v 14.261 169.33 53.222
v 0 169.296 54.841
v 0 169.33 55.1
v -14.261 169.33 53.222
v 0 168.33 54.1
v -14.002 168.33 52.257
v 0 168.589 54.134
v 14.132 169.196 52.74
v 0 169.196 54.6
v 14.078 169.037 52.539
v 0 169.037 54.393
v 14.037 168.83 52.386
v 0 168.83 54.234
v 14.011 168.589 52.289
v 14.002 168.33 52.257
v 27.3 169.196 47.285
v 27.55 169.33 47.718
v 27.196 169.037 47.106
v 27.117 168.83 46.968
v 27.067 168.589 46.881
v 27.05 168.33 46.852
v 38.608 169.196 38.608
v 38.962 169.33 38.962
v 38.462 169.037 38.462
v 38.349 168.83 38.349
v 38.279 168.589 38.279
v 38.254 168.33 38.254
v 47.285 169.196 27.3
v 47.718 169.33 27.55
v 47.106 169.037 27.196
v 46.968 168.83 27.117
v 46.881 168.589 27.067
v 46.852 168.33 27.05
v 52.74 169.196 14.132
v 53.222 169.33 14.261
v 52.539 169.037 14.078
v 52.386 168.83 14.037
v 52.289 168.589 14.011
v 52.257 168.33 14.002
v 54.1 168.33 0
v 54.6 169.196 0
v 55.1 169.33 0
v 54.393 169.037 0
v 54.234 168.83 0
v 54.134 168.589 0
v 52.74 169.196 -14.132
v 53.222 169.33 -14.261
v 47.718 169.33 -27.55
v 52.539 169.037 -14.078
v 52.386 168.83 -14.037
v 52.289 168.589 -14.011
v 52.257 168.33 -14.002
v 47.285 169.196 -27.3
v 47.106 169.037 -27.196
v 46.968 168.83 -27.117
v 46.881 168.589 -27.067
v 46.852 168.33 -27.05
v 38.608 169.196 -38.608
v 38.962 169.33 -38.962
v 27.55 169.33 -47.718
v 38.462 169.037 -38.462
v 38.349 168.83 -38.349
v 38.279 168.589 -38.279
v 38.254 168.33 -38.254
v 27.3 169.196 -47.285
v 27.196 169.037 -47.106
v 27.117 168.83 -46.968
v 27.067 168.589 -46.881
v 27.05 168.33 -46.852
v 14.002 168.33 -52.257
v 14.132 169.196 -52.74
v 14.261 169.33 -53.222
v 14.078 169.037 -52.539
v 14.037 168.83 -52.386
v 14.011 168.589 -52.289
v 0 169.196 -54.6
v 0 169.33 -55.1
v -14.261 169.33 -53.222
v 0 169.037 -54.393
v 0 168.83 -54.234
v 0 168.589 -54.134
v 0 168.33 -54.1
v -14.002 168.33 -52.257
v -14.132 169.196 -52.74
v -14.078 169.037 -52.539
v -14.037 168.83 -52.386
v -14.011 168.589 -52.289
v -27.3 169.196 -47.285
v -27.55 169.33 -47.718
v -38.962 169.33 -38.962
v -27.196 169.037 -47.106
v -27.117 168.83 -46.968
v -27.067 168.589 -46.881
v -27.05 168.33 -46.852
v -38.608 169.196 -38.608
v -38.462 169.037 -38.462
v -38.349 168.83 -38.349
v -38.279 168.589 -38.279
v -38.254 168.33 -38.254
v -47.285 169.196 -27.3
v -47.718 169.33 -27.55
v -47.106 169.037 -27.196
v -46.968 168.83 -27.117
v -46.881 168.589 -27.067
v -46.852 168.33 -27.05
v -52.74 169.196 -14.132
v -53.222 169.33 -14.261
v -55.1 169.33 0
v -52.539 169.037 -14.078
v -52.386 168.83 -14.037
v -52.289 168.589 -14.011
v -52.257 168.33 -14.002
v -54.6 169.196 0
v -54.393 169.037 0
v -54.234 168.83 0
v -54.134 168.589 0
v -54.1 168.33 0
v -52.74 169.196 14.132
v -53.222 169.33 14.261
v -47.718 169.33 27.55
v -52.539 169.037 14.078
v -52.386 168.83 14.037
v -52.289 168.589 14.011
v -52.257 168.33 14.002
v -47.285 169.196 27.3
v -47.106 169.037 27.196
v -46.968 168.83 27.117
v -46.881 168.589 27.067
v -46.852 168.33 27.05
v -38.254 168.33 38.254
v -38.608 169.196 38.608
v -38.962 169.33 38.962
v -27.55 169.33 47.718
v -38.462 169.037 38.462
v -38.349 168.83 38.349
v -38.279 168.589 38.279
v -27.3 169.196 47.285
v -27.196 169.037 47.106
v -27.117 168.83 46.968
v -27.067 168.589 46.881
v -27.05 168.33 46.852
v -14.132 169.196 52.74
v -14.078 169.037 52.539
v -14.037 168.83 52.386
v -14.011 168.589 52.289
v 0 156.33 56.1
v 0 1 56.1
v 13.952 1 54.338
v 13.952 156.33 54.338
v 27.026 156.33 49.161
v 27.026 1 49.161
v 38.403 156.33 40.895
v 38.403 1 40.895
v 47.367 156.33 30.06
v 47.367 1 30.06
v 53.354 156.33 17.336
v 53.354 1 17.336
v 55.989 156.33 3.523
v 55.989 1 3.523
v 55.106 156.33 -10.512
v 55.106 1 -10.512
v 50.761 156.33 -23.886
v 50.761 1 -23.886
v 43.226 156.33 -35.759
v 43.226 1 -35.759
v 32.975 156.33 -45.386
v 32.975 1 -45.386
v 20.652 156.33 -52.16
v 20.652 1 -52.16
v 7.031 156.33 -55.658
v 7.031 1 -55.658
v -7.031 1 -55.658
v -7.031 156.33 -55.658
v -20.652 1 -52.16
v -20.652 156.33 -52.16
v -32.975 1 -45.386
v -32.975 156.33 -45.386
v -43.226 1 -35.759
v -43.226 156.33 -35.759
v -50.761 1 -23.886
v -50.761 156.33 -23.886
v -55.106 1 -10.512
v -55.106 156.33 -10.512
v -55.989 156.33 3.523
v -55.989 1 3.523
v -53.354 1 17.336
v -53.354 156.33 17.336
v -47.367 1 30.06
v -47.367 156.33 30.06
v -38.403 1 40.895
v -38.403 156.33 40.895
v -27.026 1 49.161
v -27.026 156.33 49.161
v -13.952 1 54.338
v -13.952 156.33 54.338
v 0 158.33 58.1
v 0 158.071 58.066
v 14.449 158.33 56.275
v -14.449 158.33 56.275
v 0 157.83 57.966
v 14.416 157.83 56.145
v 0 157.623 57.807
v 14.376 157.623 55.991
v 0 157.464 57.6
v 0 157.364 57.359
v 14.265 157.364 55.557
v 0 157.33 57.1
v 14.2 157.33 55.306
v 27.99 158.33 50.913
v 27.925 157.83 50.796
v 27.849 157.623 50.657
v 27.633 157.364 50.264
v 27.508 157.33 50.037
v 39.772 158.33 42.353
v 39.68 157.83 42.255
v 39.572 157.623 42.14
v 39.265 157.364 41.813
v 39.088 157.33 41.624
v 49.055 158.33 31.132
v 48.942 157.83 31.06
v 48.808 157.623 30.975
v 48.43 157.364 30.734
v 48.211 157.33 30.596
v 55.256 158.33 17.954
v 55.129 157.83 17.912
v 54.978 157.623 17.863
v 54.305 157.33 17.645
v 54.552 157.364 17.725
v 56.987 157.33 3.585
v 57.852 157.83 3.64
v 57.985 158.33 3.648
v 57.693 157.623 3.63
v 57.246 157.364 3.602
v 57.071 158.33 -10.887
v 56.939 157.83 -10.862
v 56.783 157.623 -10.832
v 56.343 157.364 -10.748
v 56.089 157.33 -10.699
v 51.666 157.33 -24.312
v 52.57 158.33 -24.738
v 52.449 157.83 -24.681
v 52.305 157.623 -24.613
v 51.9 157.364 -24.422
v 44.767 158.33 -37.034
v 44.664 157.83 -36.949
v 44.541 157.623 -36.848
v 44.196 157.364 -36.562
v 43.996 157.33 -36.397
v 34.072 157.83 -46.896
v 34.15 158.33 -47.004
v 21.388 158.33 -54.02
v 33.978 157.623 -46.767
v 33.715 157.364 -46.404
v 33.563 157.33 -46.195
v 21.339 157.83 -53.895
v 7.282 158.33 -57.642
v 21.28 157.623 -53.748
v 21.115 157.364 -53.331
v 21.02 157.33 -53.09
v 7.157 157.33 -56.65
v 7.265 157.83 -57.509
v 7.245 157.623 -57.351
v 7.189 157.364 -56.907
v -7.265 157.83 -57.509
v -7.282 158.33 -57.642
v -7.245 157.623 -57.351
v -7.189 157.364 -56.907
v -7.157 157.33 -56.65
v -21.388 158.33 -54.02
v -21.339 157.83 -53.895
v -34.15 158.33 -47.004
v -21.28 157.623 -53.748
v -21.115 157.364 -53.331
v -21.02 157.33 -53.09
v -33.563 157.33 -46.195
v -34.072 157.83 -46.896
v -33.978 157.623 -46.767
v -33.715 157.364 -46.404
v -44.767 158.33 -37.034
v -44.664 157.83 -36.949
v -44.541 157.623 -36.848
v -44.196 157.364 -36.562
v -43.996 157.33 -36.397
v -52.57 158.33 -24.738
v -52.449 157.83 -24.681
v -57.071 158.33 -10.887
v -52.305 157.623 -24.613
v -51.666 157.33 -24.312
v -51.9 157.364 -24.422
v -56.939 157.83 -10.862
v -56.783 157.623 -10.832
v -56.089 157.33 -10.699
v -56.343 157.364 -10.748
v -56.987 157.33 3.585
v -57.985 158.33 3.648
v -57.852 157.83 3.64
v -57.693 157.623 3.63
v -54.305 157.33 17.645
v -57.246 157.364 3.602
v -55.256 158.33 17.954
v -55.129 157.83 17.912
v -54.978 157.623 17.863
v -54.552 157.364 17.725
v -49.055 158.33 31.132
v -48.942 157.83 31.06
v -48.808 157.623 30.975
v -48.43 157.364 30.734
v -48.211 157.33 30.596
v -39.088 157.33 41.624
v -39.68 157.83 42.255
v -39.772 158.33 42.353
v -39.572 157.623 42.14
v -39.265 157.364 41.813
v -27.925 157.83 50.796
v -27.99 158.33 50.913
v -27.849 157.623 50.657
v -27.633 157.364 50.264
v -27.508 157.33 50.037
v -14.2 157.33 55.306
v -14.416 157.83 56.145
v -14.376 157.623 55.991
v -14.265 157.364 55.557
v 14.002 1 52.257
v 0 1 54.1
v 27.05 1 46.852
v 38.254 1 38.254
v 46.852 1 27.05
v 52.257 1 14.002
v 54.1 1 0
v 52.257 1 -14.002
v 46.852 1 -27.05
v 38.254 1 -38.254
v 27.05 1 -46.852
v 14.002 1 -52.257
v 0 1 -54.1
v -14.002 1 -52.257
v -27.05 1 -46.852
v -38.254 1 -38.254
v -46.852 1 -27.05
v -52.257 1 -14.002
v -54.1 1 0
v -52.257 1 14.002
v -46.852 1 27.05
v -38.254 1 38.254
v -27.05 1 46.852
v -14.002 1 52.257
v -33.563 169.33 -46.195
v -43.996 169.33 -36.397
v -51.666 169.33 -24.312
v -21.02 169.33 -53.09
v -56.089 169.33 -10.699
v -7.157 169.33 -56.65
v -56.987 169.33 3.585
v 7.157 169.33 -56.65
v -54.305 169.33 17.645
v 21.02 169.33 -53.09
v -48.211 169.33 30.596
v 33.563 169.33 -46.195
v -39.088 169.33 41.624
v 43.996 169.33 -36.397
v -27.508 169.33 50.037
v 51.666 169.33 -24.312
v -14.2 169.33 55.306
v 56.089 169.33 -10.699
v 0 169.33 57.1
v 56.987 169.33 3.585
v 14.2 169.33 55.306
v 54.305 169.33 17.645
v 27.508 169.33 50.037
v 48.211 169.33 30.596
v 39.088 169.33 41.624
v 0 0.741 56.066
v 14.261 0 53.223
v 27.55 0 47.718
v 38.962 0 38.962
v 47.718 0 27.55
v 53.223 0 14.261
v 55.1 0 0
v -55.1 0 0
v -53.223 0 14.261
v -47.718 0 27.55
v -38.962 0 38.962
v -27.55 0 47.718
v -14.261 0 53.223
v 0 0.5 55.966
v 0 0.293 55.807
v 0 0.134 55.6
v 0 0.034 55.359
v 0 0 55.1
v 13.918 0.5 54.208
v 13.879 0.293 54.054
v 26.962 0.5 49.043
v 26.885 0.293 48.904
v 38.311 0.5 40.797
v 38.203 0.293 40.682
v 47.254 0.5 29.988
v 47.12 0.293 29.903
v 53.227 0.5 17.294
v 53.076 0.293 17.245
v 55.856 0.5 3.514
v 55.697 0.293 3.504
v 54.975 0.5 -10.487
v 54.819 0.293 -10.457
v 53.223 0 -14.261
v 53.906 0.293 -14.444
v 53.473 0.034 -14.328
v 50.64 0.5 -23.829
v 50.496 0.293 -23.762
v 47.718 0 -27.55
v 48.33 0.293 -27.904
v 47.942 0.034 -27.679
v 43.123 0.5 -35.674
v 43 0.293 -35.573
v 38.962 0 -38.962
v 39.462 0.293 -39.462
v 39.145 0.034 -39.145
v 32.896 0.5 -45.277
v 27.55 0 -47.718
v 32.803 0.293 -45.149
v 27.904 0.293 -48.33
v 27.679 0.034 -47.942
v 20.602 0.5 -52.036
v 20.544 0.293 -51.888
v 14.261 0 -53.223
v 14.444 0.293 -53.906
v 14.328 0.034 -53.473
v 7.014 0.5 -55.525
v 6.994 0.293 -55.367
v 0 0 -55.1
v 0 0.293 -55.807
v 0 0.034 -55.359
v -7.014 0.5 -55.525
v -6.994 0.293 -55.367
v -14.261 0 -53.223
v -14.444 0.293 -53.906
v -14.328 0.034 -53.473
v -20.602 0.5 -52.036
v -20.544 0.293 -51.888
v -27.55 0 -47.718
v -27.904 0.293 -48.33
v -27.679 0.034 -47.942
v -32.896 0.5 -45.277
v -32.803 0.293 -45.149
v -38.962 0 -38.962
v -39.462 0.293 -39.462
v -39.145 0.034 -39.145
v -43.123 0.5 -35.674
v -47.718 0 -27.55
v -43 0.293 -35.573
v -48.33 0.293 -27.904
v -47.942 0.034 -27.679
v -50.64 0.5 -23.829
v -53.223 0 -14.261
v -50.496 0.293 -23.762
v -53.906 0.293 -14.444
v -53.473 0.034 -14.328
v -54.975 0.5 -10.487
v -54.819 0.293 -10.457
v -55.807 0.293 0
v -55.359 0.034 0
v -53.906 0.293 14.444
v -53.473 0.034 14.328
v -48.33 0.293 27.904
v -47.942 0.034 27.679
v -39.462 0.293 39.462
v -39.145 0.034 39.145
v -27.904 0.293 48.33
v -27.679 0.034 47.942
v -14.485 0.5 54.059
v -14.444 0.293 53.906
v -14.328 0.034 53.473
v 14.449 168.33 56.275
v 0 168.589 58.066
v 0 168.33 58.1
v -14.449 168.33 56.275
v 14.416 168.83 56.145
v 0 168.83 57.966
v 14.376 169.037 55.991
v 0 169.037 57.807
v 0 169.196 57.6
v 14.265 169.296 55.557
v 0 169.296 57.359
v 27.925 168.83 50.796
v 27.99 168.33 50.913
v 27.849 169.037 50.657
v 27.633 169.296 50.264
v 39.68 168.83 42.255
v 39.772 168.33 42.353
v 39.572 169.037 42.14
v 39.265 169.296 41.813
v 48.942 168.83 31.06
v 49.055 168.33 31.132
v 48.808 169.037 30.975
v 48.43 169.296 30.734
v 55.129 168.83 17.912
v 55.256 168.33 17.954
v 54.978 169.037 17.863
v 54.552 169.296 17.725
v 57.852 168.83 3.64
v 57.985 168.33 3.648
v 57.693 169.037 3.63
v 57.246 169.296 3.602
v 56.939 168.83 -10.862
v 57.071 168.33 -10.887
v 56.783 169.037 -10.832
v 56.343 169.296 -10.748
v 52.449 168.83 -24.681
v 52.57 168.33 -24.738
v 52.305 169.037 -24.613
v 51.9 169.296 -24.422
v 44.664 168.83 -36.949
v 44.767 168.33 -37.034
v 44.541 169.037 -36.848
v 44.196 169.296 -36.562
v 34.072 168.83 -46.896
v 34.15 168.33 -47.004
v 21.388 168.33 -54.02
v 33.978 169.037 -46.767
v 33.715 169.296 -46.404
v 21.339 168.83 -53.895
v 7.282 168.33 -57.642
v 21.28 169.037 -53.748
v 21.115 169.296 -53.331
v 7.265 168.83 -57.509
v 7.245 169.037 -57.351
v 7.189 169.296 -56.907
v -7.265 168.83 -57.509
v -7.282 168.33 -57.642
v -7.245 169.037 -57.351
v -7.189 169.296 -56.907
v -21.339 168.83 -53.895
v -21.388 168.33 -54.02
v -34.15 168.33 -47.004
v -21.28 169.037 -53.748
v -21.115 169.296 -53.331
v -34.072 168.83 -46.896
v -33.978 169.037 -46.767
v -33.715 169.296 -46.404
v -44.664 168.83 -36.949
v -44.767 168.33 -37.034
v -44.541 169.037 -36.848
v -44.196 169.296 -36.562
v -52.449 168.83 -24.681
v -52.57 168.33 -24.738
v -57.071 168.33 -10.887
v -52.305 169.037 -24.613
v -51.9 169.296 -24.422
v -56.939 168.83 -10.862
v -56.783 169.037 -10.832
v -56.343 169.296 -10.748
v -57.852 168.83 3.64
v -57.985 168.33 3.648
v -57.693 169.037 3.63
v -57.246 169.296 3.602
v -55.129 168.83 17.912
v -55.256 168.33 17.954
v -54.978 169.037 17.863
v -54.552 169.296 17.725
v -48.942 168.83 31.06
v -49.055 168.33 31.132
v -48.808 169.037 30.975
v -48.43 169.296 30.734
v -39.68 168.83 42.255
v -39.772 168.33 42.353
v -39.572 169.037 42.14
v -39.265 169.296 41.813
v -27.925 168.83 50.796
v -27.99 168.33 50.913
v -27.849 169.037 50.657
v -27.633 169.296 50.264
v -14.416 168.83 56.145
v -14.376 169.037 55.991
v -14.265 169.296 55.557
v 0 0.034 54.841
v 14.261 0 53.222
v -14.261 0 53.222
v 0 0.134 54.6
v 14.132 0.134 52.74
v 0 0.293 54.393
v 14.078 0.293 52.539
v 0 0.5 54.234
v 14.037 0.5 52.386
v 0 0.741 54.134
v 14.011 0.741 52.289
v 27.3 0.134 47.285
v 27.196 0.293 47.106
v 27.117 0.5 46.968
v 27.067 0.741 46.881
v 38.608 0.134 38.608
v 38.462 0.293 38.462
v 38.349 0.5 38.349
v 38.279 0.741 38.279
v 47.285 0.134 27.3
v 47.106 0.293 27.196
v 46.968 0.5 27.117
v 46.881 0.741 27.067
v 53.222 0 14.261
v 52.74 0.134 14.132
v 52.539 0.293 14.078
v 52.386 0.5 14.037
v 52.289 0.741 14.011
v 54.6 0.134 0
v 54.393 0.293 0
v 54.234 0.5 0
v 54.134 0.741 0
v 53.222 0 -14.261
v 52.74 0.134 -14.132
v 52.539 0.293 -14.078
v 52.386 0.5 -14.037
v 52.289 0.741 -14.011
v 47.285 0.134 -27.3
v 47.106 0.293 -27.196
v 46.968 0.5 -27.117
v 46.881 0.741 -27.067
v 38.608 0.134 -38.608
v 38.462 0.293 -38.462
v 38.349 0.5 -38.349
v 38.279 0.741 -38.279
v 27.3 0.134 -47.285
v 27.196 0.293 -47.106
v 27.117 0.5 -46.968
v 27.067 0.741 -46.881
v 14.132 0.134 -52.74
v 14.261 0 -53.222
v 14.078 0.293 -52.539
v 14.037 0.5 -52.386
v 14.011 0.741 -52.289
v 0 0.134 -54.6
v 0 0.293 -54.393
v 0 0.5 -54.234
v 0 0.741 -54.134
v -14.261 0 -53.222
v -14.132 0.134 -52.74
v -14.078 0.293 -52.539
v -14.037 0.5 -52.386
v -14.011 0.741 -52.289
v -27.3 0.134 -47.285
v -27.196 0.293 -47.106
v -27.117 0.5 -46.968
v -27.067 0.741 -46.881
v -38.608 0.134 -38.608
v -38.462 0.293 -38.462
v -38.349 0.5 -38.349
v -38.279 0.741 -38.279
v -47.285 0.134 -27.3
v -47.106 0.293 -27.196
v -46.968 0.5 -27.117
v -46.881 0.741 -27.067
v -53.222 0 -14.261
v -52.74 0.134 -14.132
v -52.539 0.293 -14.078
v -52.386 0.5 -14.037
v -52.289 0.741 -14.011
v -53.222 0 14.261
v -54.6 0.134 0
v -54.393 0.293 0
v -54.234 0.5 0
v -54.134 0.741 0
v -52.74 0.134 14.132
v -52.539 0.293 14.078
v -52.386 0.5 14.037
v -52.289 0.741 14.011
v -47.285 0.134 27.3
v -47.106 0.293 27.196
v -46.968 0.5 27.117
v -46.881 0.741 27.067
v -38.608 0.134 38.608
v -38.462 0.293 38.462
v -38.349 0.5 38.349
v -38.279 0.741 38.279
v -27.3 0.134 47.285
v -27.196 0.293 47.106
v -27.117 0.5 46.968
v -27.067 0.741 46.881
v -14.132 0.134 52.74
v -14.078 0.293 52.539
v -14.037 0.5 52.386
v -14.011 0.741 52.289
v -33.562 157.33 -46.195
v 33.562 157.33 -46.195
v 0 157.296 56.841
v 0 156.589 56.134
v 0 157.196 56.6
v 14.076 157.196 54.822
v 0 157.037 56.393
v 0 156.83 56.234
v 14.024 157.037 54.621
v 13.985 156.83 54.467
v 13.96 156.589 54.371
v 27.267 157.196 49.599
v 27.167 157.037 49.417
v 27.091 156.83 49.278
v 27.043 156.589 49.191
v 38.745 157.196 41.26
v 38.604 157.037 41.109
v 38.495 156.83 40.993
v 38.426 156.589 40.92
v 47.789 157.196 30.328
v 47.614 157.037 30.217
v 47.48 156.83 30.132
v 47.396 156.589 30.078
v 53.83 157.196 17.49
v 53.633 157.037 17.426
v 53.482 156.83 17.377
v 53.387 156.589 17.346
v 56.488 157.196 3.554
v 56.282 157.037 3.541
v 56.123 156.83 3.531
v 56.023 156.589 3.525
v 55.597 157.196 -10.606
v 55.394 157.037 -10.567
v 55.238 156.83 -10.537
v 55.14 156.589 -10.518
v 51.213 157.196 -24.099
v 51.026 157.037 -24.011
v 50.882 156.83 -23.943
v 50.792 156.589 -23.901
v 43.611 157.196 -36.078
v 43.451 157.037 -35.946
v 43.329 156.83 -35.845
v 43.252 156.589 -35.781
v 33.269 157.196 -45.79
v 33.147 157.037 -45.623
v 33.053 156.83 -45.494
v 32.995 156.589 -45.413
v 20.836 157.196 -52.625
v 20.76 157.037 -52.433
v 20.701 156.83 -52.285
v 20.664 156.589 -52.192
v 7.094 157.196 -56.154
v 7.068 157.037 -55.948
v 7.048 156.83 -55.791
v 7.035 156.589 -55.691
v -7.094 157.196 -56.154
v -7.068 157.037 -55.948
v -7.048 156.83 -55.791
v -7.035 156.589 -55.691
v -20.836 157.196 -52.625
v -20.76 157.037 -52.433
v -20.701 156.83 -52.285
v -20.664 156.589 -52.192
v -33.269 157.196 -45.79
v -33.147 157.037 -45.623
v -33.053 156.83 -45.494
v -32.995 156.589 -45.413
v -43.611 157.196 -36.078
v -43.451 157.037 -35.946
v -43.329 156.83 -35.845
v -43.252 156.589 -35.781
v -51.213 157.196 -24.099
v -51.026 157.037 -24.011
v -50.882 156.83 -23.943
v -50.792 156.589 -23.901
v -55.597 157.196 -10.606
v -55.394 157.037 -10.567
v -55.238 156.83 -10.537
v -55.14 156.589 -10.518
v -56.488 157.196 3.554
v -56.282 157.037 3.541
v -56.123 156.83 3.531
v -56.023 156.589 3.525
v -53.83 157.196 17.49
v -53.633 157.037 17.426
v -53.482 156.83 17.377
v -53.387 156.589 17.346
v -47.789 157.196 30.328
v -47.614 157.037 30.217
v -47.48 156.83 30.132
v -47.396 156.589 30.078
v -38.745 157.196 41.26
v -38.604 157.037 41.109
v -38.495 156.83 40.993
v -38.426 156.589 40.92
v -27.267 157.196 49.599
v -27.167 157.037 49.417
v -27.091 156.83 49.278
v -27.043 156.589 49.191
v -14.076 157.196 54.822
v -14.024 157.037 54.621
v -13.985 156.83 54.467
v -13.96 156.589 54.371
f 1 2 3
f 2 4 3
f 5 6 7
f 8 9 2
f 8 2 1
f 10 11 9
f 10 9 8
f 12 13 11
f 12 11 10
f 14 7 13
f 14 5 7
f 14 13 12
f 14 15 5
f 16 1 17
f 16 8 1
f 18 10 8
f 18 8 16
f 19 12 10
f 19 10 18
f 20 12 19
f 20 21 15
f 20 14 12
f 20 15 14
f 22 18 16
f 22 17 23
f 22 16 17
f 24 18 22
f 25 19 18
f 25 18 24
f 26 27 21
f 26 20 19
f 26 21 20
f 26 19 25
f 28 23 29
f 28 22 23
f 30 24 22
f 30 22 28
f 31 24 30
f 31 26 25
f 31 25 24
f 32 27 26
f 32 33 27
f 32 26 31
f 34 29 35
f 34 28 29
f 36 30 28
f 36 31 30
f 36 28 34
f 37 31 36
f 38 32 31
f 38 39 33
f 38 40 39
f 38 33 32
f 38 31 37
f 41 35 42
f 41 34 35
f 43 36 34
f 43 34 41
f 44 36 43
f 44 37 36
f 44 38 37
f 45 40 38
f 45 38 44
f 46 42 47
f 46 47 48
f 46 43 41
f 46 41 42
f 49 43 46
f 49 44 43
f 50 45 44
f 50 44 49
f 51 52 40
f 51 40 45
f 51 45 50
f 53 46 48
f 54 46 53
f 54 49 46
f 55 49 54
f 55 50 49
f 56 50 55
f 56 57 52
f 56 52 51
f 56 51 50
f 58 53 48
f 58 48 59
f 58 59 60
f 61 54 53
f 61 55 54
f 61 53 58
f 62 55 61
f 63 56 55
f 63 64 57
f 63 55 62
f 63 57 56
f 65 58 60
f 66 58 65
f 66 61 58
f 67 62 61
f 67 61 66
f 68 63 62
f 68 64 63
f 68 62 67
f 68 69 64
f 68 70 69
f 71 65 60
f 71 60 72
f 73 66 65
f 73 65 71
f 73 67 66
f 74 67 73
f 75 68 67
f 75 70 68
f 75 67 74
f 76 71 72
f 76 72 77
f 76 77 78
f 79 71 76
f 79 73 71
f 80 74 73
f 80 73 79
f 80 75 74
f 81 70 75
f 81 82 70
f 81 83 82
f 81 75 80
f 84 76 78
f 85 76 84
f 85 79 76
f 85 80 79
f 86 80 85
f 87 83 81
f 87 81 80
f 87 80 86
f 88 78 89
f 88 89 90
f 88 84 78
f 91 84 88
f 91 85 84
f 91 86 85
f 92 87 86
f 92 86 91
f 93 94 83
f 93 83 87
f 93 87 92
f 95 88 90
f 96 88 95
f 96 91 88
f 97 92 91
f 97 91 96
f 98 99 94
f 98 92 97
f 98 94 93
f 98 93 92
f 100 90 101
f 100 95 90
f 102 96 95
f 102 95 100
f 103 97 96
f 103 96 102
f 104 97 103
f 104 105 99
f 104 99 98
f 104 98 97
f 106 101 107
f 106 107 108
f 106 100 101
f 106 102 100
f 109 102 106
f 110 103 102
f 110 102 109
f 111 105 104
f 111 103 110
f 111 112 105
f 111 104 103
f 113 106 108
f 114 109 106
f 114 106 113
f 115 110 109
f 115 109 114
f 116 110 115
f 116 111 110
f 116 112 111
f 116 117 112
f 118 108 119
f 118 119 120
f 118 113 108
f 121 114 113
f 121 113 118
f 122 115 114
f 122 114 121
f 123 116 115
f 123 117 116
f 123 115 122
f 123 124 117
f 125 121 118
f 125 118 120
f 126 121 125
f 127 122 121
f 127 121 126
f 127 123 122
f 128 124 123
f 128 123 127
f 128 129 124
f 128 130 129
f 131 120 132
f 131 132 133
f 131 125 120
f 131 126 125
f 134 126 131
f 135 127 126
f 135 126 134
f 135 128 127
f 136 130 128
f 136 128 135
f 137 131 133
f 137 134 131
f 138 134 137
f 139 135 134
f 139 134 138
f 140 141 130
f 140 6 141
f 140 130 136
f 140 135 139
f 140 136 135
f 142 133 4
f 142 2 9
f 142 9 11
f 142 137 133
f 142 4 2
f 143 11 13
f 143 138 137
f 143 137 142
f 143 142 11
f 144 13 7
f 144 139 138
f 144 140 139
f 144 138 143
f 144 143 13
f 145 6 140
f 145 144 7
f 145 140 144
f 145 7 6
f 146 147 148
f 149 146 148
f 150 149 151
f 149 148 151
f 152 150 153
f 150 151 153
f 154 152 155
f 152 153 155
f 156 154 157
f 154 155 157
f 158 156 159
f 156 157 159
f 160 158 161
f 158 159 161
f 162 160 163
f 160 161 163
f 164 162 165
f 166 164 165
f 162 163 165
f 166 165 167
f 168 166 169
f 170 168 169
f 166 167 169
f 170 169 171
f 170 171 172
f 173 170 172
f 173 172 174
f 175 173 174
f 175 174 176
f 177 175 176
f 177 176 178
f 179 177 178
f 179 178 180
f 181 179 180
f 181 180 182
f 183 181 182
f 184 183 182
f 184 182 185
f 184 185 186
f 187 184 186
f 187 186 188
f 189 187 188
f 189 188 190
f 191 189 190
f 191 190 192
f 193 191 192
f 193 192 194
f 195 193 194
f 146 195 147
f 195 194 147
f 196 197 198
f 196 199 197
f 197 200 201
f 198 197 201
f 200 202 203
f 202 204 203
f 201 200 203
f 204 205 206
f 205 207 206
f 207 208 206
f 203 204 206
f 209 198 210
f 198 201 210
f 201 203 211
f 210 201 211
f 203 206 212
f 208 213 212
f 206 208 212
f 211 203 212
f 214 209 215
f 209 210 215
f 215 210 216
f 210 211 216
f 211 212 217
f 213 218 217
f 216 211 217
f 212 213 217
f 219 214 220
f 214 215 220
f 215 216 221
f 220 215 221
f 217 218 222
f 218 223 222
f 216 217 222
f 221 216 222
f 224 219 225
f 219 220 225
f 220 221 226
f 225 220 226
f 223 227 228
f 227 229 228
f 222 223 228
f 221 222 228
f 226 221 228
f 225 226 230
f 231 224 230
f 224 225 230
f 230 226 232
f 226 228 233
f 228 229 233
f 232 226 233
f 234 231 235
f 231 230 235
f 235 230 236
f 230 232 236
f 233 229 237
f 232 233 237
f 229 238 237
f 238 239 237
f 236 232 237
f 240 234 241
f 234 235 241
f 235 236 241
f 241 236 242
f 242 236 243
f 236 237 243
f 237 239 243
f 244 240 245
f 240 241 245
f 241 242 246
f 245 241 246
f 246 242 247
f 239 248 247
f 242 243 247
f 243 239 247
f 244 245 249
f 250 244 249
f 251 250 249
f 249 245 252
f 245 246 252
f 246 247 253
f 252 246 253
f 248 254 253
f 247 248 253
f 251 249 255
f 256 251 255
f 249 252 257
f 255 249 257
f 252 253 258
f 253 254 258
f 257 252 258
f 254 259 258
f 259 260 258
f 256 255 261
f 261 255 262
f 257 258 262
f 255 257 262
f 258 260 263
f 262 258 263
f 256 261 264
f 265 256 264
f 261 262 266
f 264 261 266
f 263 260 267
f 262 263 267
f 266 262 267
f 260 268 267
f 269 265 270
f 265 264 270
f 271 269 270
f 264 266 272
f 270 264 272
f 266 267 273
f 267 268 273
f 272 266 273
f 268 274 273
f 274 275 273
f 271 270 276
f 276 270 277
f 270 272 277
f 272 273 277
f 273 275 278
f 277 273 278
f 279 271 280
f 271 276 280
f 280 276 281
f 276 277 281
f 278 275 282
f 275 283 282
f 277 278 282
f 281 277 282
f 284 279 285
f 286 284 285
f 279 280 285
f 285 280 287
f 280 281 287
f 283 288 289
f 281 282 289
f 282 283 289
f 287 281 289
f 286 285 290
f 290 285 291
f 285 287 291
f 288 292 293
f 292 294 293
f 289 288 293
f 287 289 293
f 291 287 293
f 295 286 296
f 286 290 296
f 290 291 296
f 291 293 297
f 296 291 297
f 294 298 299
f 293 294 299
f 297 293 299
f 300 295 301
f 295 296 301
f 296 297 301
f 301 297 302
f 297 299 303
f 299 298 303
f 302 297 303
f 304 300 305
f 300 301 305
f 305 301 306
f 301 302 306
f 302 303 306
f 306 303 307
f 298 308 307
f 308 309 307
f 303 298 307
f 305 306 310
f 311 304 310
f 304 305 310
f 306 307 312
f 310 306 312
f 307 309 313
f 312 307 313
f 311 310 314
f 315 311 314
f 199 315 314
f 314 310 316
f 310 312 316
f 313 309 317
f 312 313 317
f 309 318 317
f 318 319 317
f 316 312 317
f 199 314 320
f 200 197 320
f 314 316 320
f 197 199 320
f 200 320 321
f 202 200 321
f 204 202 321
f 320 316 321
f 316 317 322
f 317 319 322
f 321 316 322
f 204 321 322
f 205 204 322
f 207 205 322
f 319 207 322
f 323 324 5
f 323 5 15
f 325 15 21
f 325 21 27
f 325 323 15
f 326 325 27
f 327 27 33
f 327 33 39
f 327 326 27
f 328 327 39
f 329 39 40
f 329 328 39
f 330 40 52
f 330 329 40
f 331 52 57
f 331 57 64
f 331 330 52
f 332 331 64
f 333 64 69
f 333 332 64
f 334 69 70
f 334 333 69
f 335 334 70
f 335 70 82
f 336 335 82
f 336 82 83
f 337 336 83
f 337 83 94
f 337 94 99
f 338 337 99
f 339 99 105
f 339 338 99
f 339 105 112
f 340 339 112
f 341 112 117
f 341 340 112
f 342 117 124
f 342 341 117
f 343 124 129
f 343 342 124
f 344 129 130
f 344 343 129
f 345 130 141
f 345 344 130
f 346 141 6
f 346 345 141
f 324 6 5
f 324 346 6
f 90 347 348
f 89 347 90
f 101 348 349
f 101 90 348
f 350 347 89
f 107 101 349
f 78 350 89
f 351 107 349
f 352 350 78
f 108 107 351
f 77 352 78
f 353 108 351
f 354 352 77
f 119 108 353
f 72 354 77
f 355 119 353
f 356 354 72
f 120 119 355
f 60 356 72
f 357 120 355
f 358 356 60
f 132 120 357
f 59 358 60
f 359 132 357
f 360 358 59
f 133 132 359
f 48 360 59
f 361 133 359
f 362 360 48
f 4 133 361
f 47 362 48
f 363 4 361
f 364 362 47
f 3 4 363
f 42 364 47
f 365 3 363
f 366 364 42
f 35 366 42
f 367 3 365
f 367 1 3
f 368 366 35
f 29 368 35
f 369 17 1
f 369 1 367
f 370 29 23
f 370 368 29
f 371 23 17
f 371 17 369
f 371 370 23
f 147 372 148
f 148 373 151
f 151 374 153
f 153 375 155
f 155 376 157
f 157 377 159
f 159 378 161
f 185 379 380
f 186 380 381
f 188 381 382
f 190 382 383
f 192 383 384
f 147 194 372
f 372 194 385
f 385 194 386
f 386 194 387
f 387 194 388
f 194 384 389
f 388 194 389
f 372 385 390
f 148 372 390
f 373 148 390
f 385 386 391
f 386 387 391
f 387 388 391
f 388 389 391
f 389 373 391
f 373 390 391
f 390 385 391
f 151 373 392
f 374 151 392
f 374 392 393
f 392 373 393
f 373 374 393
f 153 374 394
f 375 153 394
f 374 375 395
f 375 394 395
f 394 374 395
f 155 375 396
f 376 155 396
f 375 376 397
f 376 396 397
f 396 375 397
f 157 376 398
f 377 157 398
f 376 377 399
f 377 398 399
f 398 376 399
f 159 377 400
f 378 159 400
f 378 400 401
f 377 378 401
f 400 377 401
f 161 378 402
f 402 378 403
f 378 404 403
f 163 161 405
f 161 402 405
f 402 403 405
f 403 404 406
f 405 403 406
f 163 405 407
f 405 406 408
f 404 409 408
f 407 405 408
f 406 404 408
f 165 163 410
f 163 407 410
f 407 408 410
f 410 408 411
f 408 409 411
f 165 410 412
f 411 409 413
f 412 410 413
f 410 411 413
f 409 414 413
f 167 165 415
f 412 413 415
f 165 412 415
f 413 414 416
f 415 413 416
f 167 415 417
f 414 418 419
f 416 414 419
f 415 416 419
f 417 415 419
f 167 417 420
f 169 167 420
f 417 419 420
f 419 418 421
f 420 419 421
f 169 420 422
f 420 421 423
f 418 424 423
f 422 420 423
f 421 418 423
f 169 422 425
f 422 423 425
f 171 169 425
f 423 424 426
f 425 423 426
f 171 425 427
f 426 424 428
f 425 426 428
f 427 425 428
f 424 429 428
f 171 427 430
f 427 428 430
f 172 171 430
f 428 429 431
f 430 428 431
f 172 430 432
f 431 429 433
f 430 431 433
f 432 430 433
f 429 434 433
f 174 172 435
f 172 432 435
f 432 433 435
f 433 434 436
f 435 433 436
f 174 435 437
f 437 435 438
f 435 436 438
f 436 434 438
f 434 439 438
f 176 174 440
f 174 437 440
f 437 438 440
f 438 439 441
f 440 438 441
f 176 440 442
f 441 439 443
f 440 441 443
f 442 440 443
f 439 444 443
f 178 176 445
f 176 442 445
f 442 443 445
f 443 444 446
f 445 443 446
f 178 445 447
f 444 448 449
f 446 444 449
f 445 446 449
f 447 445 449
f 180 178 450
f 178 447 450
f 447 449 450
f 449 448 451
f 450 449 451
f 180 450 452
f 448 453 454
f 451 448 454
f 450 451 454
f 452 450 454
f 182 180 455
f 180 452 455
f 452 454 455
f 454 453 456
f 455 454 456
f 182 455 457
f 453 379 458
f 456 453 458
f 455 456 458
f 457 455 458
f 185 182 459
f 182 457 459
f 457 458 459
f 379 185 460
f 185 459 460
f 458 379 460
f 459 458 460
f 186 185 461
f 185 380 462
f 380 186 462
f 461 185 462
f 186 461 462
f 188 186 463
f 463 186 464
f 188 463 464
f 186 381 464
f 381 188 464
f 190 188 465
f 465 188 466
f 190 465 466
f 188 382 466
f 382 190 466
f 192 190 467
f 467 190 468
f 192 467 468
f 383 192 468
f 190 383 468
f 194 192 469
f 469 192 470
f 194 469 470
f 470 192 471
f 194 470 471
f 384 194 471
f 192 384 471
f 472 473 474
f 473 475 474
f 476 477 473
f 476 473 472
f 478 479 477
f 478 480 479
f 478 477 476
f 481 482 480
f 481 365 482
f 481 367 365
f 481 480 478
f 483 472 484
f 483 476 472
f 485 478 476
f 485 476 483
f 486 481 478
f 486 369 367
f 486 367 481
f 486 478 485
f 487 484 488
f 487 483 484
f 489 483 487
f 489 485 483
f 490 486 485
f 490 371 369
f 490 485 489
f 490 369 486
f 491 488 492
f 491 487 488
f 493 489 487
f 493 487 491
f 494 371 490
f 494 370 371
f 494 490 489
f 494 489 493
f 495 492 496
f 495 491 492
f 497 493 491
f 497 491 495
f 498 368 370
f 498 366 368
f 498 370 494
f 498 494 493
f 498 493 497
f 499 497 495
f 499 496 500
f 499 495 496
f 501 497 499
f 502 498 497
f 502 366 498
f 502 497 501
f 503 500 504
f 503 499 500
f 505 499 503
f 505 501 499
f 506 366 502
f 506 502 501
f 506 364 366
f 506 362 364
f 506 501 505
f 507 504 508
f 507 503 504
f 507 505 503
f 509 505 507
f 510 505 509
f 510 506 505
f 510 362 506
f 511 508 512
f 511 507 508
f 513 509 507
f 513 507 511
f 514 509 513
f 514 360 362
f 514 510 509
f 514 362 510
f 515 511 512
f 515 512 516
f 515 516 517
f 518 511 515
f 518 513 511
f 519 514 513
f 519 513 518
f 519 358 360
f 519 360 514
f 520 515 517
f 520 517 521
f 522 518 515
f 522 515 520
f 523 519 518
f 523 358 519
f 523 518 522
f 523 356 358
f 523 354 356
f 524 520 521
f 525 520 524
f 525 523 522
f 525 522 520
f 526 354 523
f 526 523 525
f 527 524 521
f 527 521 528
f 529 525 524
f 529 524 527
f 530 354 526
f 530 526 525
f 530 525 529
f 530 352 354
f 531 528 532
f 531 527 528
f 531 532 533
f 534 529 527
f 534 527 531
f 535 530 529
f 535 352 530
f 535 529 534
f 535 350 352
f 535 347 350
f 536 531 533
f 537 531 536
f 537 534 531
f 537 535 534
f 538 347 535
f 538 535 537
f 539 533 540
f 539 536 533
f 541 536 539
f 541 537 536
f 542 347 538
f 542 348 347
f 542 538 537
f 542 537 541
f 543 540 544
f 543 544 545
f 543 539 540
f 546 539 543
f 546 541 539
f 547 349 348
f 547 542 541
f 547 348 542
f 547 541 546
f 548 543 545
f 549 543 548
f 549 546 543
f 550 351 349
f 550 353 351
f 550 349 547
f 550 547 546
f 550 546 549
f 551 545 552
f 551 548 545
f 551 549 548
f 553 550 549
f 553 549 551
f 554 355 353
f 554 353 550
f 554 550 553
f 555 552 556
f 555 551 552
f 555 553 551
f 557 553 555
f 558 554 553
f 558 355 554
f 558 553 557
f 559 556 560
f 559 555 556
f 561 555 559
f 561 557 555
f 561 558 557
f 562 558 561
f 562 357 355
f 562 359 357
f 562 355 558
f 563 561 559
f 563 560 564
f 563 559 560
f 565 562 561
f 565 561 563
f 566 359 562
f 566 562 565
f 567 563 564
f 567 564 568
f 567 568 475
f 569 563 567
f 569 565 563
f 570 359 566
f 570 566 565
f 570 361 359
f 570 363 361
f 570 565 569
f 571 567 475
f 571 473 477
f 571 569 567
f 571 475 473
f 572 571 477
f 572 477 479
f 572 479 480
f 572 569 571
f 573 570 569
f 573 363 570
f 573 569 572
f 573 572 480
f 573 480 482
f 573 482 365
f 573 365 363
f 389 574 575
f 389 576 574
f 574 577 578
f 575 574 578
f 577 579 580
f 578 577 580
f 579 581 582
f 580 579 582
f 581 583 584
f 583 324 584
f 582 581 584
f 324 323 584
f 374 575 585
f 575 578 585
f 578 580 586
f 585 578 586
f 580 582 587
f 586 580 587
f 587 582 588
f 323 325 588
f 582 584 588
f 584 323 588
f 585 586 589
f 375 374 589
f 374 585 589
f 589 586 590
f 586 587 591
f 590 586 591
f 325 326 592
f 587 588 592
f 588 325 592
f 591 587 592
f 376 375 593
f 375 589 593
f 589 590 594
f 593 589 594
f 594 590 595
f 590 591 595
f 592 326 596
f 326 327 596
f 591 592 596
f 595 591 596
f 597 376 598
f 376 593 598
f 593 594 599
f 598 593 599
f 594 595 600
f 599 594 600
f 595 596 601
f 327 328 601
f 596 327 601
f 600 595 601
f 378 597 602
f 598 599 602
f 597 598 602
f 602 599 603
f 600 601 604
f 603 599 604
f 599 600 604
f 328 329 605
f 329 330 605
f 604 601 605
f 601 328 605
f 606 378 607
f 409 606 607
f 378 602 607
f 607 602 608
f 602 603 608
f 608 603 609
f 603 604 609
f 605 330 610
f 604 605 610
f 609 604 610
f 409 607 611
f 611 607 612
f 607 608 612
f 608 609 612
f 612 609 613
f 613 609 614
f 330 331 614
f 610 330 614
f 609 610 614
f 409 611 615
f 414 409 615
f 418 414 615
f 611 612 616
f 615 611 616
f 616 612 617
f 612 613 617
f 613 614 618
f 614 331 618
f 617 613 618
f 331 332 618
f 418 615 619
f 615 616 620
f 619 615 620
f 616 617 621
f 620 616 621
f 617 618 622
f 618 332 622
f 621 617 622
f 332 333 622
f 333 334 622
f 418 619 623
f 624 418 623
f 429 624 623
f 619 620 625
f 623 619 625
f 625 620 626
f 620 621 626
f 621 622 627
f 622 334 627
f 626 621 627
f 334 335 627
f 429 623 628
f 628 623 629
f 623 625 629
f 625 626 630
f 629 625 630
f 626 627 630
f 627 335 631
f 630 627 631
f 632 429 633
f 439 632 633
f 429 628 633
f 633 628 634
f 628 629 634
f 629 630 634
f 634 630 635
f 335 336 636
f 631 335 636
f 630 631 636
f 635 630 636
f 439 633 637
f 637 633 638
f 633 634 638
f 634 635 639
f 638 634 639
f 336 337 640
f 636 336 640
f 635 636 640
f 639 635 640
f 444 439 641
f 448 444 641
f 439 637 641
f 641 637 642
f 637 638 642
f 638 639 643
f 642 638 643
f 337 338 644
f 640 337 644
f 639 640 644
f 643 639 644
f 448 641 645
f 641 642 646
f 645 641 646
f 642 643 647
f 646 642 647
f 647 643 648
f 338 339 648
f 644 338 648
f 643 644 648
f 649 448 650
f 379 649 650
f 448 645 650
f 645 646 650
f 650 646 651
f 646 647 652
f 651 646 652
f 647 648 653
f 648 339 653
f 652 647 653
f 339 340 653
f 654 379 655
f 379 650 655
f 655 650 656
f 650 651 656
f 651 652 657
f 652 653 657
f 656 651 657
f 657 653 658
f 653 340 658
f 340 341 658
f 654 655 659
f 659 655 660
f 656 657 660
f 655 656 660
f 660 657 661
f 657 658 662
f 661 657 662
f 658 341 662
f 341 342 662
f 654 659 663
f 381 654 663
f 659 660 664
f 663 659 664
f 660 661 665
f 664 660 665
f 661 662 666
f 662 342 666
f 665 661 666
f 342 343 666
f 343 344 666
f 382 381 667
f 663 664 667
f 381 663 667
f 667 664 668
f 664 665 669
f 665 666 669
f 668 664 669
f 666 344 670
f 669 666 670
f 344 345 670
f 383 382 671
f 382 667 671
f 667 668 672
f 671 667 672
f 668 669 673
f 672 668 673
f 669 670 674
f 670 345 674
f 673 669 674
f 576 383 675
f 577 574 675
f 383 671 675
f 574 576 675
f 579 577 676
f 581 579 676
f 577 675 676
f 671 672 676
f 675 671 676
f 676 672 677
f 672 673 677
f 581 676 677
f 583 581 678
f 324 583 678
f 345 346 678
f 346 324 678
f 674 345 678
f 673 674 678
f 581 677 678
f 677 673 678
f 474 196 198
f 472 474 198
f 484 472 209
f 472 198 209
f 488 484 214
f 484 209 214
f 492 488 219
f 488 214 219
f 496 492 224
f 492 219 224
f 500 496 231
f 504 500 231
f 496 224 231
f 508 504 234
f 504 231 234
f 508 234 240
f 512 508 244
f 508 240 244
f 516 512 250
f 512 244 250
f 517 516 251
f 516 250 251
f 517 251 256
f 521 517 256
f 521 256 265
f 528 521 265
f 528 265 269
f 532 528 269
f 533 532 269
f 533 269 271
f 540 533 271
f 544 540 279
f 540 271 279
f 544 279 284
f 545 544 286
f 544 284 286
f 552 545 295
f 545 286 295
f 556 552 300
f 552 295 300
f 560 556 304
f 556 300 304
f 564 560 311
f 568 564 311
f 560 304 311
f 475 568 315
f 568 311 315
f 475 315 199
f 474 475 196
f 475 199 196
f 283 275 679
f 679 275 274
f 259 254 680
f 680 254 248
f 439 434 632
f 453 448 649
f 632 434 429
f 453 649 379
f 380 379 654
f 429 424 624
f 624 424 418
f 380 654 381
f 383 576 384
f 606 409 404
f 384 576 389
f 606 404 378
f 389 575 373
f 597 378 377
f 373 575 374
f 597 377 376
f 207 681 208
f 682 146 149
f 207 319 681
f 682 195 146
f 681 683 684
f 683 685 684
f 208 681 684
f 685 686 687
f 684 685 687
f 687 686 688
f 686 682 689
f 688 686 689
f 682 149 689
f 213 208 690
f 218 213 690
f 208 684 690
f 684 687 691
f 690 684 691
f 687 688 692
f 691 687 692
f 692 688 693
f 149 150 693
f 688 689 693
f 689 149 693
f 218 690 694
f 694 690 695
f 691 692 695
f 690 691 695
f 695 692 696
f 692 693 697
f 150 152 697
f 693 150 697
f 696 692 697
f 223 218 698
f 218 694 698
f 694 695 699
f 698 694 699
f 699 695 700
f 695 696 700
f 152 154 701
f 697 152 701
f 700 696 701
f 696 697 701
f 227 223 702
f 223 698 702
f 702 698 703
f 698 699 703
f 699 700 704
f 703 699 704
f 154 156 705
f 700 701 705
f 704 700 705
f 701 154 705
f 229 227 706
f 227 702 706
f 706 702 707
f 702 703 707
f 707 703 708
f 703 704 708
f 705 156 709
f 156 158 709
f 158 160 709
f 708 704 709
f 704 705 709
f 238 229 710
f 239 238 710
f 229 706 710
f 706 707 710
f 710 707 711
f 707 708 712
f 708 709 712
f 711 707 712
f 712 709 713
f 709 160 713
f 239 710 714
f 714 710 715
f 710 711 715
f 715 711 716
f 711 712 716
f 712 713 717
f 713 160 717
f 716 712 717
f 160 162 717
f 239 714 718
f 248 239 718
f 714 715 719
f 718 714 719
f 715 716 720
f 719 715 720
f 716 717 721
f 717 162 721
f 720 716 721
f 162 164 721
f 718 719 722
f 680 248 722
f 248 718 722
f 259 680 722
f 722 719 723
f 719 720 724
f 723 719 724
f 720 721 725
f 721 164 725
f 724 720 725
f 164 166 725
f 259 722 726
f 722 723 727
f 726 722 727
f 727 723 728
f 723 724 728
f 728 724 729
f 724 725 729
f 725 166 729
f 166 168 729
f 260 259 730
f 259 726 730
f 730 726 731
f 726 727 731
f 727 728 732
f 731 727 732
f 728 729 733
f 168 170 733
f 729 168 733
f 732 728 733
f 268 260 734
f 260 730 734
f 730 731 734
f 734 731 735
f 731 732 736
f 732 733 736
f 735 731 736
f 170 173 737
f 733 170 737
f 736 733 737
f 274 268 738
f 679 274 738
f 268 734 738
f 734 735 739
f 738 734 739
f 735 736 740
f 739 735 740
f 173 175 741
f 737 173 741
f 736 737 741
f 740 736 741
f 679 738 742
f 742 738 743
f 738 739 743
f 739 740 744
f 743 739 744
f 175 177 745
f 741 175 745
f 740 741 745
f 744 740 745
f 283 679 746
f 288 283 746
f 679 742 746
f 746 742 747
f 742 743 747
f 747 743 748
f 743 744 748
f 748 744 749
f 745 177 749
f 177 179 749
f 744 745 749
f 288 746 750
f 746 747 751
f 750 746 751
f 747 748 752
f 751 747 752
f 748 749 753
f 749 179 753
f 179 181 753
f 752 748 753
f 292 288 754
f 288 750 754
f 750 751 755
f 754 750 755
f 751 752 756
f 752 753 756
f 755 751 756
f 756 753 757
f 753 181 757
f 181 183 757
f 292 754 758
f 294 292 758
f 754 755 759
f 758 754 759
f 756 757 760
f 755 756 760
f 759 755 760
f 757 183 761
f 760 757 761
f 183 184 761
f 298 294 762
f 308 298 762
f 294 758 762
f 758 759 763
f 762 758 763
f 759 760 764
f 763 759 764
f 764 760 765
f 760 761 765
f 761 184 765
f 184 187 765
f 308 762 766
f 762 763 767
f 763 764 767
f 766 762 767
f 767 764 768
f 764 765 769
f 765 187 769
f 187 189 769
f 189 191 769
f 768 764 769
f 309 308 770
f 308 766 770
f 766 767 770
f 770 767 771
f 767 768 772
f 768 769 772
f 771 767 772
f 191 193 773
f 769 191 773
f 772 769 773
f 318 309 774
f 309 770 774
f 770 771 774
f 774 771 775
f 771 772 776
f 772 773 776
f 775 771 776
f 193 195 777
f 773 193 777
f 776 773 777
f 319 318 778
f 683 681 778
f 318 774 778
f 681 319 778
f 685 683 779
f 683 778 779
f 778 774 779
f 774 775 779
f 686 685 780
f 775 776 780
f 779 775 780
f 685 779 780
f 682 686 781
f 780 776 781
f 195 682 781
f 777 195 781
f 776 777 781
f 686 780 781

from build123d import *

# Parameters (mm, degrees)
SKETCH1_R           = 56.1
SKETCH1_R_2         = 54.1
BOSS_EXTRUDE1_DEPTH = 169.33
BOSS_EXTRUDE2_START = -12
SKETCH3_R           = 58.1
SKETCH3_R_2         = 56.1
BOSS_EXTRUDE2_DEPTH = 12
FILLET1_R           = 1


with BuildPart() as part:
    # Sketch1 → Boss-Extrude1 (new body)
    with BuildSketch(Plane(origin=(0, 0, 0), x_dir=(1, 0, 0), z_dir=(0, 1, 0))):
        with Locations(Location((0, 0, 0), (0, 0, 270))):
            Circle(SKETCH1_R)
        with Locations(Location((0, 0, 0), (0, 0, 270))):
            Circle(SKETCH1_R_2, mode=Mode.SUBTRACT)
    extrude(amount=BOSS_EXTRUDE1_DEPTH)

    # Sketch3 → Boss-Extrude2 (add)
    with BuildSketch(Plane(origin=(0, 169.33, 0), x_dir=(1, 0, 0), z_dir=(0, 1, 0)).offset(BOSS_EXTRUDE2_START)):
        with Locations(Location((0, 0, 0), (0, 0, 270))):
            Circle(SKETCH3_R)
        with Locations(Location((0, 0, 0), (0, 0, 270))):
            Circle(SKETCH3_R_2, mode=Mode.SUBTRACT)
    extrude(amount=BOSS_EXTRUDE2_DEPTH)

    # Fillet1
    fillet1_edges = [part.edges().sort_by_distance(p)[0] for p in [
        (0, 157.33, -56.1),
        (0, 157.33, -58.1),
        (0, 169.33, -58.1),
        (0, 0, -56.1),
        (0, 0, -54.1),
        (0, 169.33, -54.1),
    ]]
    fillet(fillet1_edges, radius=FILLET1_R - 0.0001)  # a hair under: the kernel refuses the full size


solid = part.part
